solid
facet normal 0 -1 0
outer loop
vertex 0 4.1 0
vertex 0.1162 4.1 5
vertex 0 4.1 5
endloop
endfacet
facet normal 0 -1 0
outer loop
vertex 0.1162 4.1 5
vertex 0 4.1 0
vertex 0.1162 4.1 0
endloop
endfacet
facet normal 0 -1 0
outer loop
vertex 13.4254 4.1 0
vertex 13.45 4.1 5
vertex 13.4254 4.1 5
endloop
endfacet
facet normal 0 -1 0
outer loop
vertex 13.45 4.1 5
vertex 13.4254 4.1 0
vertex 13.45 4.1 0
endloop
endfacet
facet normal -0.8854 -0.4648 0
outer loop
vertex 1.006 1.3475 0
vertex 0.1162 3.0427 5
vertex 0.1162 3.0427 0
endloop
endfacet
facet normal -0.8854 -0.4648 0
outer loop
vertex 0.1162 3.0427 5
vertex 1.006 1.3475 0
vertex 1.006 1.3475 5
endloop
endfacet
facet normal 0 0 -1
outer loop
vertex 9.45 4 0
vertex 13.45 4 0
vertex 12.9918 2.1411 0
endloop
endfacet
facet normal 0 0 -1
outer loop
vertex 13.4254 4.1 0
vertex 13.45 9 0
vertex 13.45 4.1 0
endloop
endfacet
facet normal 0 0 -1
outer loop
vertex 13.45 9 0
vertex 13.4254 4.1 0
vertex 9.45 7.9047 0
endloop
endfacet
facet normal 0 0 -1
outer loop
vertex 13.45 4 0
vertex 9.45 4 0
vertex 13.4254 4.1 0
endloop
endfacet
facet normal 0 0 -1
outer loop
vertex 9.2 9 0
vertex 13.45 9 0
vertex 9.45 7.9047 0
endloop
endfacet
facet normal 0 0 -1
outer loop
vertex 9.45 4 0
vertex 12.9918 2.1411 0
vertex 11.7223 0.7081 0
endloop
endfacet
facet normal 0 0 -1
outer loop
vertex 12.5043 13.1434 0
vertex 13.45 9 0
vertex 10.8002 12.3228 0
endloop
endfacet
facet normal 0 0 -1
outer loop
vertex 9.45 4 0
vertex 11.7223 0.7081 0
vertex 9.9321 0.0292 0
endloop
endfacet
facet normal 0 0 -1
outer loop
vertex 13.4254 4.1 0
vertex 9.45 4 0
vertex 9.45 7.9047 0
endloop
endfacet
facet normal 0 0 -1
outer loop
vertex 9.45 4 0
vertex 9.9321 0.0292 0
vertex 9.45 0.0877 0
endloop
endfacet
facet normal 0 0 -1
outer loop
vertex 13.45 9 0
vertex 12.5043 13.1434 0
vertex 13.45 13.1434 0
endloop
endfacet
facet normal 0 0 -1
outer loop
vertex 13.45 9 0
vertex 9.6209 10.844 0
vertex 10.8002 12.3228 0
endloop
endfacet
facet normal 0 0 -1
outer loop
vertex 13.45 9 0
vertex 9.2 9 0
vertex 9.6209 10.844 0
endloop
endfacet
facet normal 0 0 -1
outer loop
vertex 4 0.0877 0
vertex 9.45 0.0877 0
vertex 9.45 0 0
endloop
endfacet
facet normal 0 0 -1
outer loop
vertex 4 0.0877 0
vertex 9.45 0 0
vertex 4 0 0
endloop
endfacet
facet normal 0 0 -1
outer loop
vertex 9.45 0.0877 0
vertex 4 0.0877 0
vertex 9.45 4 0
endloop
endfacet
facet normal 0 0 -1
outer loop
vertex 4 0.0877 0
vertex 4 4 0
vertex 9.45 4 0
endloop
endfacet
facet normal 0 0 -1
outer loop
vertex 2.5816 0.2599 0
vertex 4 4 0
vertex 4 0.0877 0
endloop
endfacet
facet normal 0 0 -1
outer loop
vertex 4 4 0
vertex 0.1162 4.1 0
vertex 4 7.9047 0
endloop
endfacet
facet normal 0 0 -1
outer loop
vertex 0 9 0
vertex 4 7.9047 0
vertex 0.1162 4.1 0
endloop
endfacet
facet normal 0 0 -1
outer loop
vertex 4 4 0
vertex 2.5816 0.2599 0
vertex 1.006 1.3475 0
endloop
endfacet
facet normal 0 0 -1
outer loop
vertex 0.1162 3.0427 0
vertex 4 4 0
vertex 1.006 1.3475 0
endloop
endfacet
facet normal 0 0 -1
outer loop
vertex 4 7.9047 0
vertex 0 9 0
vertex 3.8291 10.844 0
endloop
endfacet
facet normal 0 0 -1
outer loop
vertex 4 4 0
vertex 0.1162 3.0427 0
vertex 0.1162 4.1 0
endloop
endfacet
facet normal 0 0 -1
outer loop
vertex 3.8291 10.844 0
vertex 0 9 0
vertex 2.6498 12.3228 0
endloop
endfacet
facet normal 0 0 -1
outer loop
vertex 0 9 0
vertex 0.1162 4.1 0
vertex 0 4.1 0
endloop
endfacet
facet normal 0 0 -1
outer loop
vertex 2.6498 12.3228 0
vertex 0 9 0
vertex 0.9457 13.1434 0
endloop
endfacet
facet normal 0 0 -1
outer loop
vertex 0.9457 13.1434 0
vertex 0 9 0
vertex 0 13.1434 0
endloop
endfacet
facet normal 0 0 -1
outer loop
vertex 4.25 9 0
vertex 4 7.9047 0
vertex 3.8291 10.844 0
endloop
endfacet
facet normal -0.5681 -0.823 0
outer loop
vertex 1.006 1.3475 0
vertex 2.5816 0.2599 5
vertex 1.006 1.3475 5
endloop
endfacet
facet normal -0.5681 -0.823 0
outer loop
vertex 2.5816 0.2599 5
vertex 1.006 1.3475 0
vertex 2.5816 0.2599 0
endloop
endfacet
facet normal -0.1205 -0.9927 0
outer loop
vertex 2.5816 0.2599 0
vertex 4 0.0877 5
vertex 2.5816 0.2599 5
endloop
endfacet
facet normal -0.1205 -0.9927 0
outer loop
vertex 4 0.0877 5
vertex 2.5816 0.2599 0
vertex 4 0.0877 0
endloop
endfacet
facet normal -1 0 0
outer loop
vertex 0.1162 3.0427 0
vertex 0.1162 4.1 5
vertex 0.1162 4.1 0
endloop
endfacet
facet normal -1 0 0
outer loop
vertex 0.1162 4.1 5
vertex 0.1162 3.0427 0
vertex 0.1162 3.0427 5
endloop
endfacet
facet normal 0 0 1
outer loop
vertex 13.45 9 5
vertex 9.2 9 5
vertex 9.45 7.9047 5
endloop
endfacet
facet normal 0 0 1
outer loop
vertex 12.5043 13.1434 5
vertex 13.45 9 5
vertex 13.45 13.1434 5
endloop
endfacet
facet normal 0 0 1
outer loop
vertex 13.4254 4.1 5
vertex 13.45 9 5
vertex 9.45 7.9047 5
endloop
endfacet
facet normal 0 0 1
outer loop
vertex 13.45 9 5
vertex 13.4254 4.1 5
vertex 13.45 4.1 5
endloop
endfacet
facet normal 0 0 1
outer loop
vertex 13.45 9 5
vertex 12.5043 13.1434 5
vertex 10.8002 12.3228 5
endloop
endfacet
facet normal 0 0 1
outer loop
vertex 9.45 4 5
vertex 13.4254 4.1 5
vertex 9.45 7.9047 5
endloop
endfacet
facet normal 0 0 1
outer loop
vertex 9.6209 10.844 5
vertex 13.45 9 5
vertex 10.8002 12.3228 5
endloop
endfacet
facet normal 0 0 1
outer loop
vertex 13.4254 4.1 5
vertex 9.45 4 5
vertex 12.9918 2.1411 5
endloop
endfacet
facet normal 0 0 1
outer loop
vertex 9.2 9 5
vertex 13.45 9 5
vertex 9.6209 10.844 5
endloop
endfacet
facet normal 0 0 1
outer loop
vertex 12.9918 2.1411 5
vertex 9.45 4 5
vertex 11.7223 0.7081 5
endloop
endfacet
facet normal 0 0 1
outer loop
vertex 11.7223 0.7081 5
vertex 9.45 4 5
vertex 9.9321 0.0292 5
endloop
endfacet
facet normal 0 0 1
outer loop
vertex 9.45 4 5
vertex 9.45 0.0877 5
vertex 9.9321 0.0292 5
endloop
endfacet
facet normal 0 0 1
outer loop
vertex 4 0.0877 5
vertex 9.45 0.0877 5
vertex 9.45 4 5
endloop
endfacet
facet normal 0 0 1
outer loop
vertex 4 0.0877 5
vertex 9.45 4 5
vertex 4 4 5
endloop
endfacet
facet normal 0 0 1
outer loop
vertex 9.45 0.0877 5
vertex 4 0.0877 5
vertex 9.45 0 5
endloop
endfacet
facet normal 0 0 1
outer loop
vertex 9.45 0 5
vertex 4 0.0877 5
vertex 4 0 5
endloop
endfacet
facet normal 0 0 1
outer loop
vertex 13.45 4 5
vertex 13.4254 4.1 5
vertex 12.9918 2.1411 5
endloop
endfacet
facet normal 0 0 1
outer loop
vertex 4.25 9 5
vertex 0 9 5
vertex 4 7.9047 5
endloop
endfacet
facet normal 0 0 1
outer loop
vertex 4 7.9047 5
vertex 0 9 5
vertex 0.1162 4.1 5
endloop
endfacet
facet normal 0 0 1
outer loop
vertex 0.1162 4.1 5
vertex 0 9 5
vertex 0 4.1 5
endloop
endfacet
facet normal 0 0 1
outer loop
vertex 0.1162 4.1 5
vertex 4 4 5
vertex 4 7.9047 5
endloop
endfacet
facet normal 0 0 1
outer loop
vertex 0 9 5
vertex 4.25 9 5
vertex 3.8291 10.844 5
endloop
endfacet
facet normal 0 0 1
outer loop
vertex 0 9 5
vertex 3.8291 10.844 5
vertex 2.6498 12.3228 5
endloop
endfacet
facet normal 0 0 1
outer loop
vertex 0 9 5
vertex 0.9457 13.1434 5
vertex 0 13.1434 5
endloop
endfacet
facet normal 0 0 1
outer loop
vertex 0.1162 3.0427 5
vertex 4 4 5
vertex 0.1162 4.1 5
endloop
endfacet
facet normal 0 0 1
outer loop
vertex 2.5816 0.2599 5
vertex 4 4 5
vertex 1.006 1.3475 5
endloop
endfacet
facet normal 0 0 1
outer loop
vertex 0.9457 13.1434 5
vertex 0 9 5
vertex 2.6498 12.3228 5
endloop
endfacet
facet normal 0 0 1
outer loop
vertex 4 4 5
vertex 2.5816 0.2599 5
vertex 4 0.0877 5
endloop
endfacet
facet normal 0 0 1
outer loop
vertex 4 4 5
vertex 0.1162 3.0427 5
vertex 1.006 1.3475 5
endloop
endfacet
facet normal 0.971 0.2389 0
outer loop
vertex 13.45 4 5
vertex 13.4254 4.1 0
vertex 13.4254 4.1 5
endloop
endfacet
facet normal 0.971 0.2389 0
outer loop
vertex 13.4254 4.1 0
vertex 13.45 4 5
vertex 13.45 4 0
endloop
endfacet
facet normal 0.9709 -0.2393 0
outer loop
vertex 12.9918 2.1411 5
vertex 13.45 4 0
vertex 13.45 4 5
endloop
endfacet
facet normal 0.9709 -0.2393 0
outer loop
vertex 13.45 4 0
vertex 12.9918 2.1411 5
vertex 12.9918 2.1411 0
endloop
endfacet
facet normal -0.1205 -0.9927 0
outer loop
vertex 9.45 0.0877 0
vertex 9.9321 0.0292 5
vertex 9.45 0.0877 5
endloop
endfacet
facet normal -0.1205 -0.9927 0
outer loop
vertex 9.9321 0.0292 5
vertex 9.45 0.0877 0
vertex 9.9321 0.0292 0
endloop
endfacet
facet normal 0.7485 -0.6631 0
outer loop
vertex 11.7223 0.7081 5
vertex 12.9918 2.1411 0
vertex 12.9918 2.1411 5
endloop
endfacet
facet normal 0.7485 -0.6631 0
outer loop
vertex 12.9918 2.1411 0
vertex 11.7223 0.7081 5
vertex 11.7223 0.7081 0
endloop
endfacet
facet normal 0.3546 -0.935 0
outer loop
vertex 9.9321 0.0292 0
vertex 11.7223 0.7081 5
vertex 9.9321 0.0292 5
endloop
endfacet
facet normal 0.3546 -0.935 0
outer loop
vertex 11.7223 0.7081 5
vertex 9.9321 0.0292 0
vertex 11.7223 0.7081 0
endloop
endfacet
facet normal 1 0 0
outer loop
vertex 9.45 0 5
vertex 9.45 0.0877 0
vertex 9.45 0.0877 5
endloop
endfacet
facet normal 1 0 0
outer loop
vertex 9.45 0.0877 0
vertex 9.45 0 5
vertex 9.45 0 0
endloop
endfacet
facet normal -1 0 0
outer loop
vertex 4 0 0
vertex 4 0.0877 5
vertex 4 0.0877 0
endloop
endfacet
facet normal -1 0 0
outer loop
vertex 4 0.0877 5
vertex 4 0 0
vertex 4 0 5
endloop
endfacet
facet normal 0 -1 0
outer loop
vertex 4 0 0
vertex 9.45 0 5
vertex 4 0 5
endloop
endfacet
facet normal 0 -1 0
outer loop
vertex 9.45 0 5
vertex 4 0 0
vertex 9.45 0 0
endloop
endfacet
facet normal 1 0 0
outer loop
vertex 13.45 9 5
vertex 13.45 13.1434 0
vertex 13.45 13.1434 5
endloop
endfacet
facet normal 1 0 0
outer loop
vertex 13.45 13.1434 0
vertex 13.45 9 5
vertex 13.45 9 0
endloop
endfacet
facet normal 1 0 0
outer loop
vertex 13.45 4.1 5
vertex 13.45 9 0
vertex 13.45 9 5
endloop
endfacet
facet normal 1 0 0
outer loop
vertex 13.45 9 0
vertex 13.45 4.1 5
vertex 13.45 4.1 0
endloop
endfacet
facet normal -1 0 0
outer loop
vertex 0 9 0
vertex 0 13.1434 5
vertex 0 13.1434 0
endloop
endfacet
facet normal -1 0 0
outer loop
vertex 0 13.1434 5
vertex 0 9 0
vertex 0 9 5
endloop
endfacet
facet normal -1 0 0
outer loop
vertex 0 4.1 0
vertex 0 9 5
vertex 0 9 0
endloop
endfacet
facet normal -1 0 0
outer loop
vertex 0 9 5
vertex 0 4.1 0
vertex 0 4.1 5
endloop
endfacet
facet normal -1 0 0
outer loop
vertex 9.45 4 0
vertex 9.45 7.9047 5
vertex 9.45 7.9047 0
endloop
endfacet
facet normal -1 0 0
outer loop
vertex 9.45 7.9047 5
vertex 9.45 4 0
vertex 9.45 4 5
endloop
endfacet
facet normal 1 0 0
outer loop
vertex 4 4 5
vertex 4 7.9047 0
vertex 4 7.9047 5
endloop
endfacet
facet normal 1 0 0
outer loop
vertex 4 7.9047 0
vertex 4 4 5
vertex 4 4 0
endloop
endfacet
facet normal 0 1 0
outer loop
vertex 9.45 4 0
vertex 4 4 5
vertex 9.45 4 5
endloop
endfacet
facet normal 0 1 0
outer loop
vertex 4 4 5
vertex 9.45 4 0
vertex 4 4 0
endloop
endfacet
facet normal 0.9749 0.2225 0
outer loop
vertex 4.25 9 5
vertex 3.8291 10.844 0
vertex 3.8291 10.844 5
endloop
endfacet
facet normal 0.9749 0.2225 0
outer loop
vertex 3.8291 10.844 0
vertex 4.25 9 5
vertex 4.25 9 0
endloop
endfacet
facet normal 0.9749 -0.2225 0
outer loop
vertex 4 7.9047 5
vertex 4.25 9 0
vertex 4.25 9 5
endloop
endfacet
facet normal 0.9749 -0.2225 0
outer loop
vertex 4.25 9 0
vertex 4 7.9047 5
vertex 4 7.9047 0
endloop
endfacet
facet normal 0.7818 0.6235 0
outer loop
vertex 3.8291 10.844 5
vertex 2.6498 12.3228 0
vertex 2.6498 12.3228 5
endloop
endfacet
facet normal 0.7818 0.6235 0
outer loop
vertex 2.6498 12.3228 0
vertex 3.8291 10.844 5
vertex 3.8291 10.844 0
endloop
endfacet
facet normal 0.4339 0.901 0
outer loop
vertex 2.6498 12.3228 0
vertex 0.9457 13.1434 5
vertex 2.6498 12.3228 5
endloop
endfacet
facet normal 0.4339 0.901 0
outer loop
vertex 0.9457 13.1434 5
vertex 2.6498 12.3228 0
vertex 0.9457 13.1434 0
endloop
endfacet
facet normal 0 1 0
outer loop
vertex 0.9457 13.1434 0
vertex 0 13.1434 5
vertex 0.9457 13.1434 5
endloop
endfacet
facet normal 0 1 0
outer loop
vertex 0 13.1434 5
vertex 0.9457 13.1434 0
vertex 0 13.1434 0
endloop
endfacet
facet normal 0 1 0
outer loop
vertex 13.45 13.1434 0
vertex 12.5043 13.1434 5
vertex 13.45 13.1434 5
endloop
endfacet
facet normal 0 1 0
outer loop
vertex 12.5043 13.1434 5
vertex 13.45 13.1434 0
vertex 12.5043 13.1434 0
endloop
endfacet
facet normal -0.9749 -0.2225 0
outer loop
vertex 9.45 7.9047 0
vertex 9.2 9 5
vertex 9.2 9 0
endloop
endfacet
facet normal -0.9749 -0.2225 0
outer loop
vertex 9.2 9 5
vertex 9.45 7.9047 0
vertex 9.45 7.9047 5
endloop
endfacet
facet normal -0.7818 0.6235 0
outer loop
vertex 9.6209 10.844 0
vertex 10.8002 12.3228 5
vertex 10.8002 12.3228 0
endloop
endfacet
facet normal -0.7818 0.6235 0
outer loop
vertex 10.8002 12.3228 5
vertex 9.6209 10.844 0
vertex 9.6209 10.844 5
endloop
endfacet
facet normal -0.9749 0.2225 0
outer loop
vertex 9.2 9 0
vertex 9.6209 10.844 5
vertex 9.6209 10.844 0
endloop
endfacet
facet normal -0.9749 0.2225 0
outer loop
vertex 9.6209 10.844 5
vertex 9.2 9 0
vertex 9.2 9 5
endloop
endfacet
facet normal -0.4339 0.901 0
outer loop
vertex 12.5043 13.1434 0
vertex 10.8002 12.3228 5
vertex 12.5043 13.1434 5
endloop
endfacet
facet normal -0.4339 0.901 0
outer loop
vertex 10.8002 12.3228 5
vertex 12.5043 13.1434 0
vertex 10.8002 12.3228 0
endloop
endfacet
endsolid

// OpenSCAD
bed_thick=3.2;				//thickness of bed plate to clamp glass onto
glass_thick=2.25;		//thickness of glass plate to be clamped
width=5;					//how wide the clip will be
clip_thick=4;				//thickness of the clip bars
depth=5;					//how deep the clip will go onto the glass
nub=.25;					//how much the nubs should be smaller than the bed-glass combo for a tight fit


union(){
	difference(){
		cube([bed_thick+glass_thick+2*clip_thick,depth+clip_thick,width]);
		translate([clip_thick,clip_thick,-0.1])
			cube([bed_thick+glass_thick,depth+0.1,width+0.2]);
		difference(){
			translate([-0.1,-0.1,-0.1])
				cube([bed_thick+glass_thick+2*clip_thick+0.2,clip_thick+0.2,width+0.2]);
			translate([clip_thick,clip_thick,0])
				cylinder(h=width,r=clip_thick);
			translate([clip_thick+glass_thick+bed_thick,clip_thick,0])
				cylinder(h=width,r=clip_thick);
			translate([clip_thick,0,-0.1])
				cube([glass_thick+bed_thick,clip_thick,width+0.2]);
		}
	}
	difference(){
		translate([0,clip_thick+depth,0])
			cylinder(h=width,r=clip_thick+nub);
		translate([-clip_thick-nub,0,-0.1])
			cube([clip_thick+nub,100,width+0.2]);
	}
	difference(){
		translate([bed_thick+glass_thick+2*clip_thick,clip_thick+depth,0])
			cylinder(h=width,r=clip_thick+nub);
		translate([bed_thick+glass_thick+2*clip_thick,0,-0.1])
			cube([clip_thick+nub,100,width+0.2]);
	}

}
